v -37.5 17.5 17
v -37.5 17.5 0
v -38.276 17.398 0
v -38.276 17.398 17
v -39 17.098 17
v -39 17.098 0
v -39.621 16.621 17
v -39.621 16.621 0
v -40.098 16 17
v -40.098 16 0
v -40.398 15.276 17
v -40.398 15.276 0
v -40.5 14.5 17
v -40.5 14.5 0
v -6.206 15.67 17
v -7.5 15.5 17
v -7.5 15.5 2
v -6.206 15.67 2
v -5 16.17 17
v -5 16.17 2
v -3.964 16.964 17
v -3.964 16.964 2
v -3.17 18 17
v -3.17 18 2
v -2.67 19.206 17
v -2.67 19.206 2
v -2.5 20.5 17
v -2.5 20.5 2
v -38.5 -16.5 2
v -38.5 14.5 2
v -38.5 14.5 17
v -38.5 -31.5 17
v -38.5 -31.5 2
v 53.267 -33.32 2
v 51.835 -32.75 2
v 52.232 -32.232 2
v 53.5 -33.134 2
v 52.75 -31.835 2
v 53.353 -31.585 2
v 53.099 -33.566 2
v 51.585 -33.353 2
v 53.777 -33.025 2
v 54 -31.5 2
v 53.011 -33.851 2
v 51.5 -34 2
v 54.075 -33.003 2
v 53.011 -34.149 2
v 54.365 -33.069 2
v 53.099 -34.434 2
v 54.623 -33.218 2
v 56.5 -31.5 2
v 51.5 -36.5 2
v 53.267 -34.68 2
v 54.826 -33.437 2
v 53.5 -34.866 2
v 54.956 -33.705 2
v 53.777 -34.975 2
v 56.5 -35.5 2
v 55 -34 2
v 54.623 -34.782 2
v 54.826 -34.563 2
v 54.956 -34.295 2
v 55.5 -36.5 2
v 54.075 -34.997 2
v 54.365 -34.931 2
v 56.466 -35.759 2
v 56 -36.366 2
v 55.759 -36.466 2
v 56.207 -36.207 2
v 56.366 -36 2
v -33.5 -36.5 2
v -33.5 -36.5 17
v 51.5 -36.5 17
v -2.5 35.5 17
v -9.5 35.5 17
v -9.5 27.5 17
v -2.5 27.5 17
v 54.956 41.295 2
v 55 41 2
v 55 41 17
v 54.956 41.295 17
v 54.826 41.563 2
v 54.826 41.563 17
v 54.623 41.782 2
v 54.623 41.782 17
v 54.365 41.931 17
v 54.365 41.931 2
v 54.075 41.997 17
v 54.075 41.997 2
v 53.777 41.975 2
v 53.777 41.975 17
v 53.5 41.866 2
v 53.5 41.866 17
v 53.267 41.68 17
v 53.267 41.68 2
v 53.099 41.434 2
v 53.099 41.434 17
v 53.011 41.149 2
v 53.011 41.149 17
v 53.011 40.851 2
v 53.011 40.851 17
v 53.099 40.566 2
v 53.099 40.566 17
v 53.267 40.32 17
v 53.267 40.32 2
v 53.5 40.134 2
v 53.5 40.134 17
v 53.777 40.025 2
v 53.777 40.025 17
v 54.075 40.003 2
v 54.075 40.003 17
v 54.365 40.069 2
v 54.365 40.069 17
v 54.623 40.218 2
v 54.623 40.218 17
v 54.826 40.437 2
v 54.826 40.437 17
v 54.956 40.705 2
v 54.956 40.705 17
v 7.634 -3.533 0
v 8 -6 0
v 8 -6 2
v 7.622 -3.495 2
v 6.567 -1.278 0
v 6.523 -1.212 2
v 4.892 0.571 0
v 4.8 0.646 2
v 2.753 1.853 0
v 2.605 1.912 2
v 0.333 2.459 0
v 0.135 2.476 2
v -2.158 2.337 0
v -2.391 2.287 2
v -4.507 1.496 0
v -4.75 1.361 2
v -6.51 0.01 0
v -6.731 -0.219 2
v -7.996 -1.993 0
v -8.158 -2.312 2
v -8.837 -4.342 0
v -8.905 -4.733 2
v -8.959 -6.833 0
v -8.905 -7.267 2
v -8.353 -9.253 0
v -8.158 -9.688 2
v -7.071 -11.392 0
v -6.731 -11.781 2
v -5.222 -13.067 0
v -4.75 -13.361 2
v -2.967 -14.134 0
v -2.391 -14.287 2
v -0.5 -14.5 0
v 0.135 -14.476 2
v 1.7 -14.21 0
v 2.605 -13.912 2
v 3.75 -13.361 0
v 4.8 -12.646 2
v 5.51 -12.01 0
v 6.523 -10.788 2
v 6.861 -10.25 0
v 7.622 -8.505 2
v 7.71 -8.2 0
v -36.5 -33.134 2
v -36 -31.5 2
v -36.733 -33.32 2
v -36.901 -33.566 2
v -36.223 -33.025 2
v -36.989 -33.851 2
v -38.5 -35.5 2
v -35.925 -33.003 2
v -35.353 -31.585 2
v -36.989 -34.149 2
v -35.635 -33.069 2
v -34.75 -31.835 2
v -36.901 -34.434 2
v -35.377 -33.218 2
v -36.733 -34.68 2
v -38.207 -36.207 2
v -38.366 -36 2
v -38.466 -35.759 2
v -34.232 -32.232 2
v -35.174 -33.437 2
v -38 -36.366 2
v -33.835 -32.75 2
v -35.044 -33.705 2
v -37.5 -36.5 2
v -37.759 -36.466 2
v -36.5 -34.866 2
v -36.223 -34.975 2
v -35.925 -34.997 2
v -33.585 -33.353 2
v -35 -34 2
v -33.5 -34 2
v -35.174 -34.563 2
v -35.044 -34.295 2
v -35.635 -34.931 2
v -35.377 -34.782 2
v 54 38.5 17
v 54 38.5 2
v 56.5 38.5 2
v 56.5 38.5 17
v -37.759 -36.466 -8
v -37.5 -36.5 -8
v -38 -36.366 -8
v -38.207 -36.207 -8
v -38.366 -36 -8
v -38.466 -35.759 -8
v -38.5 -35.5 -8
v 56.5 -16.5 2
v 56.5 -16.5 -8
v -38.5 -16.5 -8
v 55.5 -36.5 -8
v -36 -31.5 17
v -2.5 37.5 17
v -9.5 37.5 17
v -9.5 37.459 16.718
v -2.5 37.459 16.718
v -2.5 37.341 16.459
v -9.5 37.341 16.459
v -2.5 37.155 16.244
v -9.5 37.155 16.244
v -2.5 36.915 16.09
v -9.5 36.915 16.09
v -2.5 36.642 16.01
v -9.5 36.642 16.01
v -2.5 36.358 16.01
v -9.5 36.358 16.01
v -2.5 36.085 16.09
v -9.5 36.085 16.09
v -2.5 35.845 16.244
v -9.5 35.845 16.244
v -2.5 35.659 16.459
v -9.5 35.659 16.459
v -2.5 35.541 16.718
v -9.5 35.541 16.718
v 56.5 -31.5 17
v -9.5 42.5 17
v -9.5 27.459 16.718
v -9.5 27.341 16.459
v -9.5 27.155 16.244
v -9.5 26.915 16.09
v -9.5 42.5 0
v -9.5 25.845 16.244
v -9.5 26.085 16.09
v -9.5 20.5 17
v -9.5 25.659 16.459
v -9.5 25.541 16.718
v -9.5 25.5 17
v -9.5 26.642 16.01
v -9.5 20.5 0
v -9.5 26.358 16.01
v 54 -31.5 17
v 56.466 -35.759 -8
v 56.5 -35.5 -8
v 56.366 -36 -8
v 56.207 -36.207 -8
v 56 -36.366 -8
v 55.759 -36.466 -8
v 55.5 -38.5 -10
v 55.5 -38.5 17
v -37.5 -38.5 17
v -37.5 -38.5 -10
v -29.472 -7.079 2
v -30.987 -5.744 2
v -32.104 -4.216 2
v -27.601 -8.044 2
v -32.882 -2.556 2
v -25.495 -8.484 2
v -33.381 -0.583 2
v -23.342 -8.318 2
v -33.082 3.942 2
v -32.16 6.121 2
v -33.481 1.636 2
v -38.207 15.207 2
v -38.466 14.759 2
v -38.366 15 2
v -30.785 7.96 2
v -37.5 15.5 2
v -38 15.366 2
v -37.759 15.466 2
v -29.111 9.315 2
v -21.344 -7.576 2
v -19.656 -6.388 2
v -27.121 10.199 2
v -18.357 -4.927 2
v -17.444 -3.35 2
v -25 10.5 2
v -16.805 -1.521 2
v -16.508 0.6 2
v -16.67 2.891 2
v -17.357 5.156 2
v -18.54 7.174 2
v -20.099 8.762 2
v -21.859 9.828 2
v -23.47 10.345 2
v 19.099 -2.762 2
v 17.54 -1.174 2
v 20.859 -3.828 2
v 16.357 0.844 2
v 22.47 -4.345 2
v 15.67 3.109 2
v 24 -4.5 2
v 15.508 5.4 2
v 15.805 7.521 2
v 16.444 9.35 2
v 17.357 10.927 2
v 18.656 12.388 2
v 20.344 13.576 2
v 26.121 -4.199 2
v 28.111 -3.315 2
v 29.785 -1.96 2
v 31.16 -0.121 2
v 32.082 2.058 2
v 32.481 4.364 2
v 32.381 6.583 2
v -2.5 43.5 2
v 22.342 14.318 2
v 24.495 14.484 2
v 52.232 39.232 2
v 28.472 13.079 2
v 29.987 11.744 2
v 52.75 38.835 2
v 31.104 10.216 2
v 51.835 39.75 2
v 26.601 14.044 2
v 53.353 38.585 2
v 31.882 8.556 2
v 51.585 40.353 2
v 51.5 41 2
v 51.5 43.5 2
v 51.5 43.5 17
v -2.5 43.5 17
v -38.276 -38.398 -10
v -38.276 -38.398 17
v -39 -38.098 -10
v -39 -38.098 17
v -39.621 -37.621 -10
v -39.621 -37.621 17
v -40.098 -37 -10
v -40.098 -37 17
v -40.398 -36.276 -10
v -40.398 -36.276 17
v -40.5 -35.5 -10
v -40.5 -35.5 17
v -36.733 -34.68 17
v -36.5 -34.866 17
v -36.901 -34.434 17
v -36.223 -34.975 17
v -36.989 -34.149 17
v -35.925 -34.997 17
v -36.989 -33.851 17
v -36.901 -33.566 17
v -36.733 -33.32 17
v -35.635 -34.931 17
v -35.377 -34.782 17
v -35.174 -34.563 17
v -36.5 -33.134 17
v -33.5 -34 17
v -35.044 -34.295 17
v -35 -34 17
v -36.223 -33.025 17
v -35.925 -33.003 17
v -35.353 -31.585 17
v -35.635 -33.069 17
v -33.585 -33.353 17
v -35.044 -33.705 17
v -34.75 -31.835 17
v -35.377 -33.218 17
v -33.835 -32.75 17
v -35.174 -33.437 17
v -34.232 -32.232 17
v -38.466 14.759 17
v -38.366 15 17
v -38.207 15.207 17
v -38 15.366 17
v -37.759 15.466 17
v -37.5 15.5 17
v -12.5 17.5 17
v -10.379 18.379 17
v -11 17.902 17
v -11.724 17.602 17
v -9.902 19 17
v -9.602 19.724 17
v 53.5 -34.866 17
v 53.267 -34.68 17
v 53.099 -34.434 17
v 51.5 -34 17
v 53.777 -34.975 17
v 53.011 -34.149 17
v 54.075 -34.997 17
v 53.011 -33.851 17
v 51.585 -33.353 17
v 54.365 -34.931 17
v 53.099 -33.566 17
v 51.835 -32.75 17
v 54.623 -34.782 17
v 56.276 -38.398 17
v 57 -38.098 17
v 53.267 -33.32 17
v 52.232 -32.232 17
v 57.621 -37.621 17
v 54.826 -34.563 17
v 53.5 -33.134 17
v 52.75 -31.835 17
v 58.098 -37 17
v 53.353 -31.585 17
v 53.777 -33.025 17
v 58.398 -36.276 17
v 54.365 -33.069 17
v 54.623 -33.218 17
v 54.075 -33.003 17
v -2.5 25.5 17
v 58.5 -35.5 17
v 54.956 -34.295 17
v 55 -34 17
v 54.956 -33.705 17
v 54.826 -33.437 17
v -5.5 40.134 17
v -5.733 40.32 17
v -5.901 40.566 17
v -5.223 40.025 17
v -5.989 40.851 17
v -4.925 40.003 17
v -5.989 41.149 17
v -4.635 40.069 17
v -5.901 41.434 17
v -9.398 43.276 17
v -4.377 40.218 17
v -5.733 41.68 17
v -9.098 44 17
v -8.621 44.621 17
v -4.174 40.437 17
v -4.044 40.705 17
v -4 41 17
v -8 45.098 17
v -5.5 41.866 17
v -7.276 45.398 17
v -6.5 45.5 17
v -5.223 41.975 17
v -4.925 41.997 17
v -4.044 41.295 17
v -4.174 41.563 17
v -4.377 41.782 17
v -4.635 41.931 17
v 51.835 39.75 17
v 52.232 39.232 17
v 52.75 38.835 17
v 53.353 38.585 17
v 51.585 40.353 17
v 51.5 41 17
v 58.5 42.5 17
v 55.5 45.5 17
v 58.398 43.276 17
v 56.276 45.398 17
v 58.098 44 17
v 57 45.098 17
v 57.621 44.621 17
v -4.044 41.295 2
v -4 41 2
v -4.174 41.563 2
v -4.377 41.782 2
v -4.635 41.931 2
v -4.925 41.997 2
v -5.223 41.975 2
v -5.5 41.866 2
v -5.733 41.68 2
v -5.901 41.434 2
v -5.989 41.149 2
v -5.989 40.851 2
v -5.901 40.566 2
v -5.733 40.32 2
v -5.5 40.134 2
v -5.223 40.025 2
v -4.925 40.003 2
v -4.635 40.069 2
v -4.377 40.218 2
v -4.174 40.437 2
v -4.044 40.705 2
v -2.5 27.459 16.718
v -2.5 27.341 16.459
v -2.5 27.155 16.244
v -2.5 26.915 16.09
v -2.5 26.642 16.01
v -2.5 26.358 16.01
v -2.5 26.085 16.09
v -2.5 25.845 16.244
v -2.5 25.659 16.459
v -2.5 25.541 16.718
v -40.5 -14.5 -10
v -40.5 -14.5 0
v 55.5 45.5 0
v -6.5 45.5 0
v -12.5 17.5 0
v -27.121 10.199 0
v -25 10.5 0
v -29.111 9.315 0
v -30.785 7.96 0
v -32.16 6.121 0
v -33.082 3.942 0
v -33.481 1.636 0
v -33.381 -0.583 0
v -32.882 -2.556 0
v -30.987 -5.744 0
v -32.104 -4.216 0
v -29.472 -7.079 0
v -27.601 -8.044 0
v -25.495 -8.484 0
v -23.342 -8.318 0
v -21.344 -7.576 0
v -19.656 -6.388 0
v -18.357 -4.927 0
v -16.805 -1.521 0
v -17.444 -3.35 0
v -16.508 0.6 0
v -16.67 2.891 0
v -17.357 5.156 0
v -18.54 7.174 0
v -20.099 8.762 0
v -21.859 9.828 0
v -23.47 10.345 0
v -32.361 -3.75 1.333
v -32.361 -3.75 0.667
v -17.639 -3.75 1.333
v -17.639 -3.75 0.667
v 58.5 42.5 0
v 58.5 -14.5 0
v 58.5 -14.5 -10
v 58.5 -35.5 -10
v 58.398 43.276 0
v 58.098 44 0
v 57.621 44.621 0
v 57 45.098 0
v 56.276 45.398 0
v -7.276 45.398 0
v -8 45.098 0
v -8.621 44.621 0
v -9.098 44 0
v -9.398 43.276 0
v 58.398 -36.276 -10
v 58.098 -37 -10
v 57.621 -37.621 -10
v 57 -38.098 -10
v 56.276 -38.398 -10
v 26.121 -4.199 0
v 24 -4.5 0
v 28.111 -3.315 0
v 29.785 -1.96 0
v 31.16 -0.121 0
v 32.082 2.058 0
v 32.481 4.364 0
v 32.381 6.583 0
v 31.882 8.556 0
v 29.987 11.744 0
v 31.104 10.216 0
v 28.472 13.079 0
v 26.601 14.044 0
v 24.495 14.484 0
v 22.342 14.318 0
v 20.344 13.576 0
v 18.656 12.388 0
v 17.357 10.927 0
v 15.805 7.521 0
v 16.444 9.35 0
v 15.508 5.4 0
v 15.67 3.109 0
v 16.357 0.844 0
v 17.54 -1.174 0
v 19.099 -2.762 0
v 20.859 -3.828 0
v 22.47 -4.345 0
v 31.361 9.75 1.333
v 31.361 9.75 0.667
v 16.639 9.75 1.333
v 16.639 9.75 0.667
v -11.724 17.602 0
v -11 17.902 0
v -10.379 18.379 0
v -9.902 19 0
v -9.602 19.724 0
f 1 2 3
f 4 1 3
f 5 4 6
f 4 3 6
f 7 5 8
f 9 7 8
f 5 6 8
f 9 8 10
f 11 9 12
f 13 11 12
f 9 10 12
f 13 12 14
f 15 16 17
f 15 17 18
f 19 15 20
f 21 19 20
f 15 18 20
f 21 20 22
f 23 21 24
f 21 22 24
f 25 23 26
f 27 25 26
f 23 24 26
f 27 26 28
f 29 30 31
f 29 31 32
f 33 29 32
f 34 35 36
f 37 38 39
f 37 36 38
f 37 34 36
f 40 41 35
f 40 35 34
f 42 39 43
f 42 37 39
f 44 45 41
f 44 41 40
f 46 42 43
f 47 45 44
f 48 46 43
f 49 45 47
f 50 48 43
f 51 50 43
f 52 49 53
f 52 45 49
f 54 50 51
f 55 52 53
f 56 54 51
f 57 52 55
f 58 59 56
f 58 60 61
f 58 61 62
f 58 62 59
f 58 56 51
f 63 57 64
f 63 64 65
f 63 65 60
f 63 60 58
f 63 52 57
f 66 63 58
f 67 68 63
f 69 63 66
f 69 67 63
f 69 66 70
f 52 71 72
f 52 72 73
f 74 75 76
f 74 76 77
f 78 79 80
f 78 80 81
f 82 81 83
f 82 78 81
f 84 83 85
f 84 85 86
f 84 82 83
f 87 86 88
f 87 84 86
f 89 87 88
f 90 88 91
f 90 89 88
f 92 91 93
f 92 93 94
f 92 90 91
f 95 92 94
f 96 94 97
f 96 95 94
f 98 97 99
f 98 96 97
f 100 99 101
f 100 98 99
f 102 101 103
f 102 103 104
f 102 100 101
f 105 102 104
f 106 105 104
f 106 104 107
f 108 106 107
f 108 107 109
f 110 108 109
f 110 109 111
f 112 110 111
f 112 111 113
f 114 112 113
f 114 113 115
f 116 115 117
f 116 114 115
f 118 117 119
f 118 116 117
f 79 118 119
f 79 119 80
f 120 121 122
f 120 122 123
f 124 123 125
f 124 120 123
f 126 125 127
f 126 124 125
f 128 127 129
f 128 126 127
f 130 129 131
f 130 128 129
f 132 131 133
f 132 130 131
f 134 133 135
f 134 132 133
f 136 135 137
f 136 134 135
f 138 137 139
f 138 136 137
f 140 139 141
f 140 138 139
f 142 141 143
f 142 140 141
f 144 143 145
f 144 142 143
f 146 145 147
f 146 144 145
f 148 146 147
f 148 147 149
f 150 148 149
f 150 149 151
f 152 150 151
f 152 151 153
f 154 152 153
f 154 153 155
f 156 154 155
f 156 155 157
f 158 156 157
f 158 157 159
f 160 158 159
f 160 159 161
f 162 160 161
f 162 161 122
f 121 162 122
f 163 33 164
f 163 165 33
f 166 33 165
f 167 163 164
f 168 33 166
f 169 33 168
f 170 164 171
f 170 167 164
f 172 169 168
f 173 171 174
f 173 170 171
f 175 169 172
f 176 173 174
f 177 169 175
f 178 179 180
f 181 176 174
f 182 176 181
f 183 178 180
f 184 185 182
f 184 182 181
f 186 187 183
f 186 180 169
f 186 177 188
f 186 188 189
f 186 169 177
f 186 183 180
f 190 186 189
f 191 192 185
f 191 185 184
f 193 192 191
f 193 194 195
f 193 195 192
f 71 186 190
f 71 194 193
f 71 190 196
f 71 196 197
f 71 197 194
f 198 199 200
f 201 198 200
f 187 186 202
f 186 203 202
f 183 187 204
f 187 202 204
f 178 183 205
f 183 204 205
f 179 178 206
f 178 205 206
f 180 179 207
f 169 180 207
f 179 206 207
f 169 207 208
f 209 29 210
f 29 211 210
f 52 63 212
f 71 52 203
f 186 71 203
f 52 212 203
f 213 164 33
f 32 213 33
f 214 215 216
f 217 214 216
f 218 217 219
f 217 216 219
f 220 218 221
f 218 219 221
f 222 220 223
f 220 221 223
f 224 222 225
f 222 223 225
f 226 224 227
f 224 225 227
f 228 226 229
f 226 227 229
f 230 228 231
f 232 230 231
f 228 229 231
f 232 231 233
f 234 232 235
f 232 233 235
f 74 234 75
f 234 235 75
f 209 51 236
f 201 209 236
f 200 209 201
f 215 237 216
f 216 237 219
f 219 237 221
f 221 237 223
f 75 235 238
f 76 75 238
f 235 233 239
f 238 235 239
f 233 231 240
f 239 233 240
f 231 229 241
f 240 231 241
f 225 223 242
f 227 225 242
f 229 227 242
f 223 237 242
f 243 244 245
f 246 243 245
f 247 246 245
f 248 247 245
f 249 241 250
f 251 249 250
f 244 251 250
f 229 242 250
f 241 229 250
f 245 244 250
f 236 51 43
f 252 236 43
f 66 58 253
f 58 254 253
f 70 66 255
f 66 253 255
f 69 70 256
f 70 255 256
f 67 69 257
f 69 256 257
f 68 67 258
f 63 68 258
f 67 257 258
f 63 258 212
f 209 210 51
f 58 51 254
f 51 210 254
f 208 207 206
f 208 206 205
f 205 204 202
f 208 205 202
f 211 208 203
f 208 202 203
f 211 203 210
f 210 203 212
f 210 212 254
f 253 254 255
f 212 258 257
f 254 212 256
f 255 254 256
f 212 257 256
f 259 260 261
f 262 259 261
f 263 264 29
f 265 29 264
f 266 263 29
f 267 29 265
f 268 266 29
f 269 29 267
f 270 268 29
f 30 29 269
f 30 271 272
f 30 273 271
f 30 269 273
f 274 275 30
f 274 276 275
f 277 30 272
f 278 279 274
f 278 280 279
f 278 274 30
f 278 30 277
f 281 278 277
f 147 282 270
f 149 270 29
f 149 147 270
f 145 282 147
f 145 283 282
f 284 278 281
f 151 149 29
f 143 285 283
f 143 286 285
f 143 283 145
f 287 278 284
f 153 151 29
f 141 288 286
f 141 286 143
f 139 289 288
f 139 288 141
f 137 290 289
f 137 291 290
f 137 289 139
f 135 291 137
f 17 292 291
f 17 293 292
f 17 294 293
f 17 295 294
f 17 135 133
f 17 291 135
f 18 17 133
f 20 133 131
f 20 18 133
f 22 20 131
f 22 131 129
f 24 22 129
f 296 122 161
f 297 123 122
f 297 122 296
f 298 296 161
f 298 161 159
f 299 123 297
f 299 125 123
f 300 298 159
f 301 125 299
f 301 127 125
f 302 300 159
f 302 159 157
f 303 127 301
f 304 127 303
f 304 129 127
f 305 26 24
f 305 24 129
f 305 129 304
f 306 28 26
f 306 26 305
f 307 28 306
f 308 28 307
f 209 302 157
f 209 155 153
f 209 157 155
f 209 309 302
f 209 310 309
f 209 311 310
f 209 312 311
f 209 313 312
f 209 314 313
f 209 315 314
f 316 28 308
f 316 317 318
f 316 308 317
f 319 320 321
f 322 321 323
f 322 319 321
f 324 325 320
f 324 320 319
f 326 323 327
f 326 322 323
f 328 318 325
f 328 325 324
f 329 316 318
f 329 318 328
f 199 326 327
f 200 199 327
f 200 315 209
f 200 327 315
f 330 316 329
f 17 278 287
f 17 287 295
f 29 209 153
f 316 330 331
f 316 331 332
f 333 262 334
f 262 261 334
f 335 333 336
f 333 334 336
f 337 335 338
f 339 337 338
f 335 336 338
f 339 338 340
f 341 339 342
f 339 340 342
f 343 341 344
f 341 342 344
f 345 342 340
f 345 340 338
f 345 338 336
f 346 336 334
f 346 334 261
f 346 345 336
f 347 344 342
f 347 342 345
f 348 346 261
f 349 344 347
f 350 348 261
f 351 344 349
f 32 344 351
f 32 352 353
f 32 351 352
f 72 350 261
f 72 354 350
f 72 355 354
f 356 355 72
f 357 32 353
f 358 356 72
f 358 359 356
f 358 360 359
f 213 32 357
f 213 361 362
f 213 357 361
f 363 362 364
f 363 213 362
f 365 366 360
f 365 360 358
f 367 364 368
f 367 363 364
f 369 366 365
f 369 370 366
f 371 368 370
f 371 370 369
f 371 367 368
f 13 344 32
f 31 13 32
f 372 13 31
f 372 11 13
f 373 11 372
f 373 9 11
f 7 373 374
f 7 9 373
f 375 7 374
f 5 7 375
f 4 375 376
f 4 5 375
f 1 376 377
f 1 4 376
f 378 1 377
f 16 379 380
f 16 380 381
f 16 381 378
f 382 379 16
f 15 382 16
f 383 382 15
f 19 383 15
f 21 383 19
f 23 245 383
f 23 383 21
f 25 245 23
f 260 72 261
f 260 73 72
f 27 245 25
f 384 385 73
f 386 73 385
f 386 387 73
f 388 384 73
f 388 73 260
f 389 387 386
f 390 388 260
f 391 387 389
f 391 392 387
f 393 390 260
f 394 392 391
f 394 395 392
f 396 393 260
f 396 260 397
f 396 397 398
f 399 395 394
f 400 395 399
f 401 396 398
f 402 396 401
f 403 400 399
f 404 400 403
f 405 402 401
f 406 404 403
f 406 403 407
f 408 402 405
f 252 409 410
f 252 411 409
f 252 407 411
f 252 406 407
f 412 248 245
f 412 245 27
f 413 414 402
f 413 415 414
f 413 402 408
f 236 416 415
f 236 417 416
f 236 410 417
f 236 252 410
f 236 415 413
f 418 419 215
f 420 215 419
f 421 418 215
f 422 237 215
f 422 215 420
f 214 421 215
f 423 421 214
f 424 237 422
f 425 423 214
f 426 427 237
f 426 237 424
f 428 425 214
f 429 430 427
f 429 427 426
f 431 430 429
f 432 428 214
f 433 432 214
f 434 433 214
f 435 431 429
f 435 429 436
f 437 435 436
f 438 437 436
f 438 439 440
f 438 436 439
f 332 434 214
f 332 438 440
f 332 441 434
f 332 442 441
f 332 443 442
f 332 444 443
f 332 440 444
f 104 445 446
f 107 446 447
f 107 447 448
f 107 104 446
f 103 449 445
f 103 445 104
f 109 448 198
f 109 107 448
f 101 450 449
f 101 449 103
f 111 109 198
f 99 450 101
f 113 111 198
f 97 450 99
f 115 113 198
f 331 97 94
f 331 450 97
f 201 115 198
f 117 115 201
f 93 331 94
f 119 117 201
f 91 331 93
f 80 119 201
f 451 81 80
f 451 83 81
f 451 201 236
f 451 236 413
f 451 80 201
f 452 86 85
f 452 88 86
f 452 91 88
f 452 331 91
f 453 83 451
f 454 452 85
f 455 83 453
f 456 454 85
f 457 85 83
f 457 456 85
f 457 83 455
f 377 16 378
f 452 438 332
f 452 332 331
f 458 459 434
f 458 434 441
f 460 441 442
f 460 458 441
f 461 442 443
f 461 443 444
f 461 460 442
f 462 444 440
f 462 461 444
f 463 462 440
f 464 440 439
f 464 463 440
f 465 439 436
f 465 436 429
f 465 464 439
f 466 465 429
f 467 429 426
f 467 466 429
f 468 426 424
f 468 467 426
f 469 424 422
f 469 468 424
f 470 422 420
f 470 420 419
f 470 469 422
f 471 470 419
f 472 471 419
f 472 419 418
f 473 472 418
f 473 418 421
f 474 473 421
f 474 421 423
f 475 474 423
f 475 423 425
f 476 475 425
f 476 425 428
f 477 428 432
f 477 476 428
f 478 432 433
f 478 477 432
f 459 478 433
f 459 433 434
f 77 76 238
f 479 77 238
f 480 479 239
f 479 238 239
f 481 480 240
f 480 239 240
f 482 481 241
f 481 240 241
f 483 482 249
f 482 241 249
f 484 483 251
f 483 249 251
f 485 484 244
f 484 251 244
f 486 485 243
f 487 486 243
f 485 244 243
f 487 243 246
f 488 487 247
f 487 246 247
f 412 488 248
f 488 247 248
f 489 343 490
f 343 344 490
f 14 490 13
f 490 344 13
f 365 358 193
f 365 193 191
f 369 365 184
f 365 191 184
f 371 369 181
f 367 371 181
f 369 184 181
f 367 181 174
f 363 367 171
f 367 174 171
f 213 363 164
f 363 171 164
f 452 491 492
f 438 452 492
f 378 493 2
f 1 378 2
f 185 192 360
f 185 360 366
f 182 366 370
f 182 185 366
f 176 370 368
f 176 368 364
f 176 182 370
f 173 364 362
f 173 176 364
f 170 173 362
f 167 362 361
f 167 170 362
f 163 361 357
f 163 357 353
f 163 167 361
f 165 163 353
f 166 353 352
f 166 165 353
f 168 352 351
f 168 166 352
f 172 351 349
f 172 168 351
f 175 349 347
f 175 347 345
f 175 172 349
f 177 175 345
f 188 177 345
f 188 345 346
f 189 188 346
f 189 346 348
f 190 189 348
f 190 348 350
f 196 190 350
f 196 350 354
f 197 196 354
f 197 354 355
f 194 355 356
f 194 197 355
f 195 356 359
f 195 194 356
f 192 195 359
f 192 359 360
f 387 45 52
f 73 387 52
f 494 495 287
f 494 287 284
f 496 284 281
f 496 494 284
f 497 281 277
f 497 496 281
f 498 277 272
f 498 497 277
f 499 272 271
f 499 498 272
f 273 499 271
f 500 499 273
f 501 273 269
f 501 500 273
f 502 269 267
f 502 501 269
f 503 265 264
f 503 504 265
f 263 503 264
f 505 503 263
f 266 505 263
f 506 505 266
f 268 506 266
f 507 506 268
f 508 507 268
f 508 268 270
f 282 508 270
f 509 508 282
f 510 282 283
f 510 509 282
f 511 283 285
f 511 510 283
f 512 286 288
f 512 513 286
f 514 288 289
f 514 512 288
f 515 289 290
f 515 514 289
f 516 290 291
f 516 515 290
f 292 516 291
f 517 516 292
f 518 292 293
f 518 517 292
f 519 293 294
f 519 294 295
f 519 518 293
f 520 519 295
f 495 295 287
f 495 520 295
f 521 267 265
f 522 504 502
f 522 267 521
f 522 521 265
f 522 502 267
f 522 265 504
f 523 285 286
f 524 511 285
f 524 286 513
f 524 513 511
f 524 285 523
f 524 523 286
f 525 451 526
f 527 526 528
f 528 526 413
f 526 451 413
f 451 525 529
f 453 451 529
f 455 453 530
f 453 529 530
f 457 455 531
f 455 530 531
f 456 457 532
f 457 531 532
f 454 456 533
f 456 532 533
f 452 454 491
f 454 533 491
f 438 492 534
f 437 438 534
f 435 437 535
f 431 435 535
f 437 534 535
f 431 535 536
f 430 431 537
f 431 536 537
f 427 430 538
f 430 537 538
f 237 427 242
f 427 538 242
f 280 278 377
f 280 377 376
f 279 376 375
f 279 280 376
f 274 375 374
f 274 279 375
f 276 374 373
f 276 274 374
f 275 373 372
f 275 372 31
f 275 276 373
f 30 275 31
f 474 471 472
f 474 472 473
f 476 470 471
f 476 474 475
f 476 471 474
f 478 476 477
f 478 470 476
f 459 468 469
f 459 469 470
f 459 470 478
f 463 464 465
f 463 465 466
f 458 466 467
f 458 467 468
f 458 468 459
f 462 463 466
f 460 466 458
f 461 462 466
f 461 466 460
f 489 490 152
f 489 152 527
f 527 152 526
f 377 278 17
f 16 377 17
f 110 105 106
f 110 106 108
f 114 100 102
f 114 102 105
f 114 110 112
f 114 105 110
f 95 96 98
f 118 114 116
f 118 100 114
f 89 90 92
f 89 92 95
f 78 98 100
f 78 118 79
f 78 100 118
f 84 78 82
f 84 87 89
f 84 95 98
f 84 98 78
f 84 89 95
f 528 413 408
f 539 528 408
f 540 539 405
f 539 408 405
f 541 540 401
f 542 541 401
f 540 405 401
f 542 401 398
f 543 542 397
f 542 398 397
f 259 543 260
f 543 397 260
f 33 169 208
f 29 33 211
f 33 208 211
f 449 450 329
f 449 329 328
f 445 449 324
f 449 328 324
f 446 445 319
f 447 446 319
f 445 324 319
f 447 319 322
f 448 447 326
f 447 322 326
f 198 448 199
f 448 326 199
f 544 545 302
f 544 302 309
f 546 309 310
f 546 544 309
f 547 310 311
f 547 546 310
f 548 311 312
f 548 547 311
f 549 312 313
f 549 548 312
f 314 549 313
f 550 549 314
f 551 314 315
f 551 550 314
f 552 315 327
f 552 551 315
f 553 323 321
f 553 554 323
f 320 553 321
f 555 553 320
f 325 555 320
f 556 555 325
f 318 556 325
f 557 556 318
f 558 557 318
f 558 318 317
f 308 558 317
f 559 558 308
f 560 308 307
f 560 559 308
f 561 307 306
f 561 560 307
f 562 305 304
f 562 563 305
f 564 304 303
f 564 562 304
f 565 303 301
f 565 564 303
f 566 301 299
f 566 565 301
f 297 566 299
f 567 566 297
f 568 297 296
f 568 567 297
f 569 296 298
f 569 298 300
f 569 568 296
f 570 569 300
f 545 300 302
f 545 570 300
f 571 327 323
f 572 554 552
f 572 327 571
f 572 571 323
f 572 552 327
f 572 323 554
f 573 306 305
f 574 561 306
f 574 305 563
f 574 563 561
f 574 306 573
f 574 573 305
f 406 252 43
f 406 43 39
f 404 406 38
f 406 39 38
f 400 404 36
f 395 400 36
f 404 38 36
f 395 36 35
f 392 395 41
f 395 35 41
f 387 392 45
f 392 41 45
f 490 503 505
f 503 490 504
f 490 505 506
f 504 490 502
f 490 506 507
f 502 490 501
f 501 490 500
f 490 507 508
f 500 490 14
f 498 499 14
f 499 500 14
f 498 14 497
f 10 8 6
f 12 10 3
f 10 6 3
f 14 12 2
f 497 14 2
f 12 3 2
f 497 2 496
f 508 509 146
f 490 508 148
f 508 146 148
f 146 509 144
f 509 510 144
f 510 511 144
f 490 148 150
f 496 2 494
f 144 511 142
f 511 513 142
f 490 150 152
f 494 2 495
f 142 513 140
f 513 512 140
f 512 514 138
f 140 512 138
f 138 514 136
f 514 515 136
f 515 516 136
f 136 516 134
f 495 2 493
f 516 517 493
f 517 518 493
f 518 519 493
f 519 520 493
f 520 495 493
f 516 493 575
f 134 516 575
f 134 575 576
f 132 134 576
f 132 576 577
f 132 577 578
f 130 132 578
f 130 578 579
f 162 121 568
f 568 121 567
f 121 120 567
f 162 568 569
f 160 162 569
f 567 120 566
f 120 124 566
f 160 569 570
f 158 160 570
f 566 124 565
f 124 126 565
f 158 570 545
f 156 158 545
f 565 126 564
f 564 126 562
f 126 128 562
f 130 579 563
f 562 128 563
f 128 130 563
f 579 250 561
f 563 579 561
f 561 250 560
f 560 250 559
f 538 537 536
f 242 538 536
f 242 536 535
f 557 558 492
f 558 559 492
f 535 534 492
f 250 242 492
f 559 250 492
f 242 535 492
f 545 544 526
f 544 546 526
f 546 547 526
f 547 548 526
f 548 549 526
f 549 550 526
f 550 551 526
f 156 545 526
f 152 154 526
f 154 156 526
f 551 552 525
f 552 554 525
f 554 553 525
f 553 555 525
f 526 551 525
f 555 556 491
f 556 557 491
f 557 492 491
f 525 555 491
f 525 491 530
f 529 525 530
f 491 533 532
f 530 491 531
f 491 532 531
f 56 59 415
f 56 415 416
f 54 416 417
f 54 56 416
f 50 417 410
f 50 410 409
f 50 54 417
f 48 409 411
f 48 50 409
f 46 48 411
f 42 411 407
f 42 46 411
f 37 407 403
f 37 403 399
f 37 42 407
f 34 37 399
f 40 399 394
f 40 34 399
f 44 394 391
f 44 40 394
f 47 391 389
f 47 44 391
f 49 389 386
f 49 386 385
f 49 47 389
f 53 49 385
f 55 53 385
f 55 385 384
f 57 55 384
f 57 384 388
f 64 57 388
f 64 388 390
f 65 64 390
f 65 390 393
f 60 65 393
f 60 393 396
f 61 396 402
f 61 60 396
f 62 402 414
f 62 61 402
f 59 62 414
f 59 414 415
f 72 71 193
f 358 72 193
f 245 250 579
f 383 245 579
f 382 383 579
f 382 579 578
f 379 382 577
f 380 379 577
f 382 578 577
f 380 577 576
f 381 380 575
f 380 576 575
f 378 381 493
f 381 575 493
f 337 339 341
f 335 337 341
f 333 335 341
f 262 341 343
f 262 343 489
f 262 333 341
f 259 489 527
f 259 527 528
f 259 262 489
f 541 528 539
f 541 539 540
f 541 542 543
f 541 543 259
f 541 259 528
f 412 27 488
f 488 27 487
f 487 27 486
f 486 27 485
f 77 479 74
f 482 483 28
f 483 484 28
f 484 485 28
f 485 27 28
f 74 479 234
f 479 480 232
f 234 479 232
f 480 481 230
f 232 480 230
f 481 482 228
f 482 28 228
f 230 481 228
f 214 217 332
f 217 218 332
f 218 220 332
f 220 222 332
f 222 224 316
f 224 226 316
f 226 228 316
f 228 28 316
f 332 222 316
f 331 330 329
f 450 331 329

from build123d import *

# Parameters (mm, degrees)
F1_DEPTH  = 17
F3_T      = -2
F2_R      = 8.5
F4_DEPTH  = 2
F5_R      = 1
F6_DEPTH  = 15
F7_R      = 1
F8_DEPTH  = 7
F11_DEPTH = 10
F12_DEPTH = 8
F13_DEPTH = 2


with BuildPart() as f1:
    # F0 (on Top) → F1 (new body)
    with BuildSketch(Plane.XY):
        with BuildLine():
            Line((-12.5, 17.5), (-37.5, 17.5))
            ThreePointArc((-37.5, 17.5), (-39.6213203436, 16.6213203436), (-40.5, 14.5))
            Line((-40.5, 14.5), (-40.5, -17.5))
            Line((-40.5, -17.5), (-40.5, -35.5))
            ThreePointArc((-40.5, -35.5), (-39.6213203436, -37.6213203436), (-37.5, -38.5))
            Line((-37.5, -38.5), (55.5, -38.5))
            ThreePointArc((55.5, -38.5), (57.6213203436, -37.6213203436), (58.5, -35.5))
            Line((58.5, -35.5), (58.5, -17.5))
            Line((58.5, -17.5), (40.5, -17.5))
            Line((40.5, -17.5), (40.5, 17.5))
            Line((40.5, 17.5), (40.5, 42.5))
            ThreePointArc((40.5, 42.5), (39.6213203436, 44.6213203436), (37.5, 45.5))
            Line((37.5, 45.5), (-6.5, 45.5))
            ThreePointArc((-6.5, 45.5), (-8.6213203436, 44.6213203436), (-9.5, 42.5))
            Line((-9.5, 42.5), (-9.5, 20.5))
            ThreePointArc((-9.5, 20.5), (-10.3786796564, 18.3786796564), (-12.5, 17.5))
        make_face()
        with BuildLine():
            Line((55.5, 45.5), (37.5, 45.5))
            ThreePointArc((37.5, 45.5), (39.6213203436, 44.6213203436), (40.5, 42.5))
            Line((40.5, 42.5), (40.5, 17.5))
            Line((40.5, 17.5), (40.5, -17.5))
            Line((40.5, -17.5), (58.5, -17.5))
            Line((58.5, -17.5), (58.5, 42.5))
            ThreePointArc((58.5, 42.5), (57.6213203436, 44.6213203436), (55.5, 45.5))
        make_face()
    extrude(amount=F1_DEPTH)

    # F3
    f3_openings = [f1.faces().sort_by_distance(p)[0] for p in [
        (12.966173, 0.233802, 17),
    ]]
    offset(amount=F3_T, openings=f3_openings)

    # F2 (on Top) → F4 (cut, through all)
    with BuildSketch(Plane.XY):
        with BuildLine():
            add(Edge.make_bspline(
                [(-25, 10.5), (-39.7224318643, 10.5), (-32.3612159322, -3.75), (-25, -18), (-17.6387840678, -3.75), (-10.2775681357, 10.5), (-25, 10.5)],
                knots=[0, 0, 0, 2.0943951024, 2.0943951024, 4.1887902048, 4.1887902048, 6.2831853072, 6.2831853072, 6.2831853072], degree=2, weights=[1, 0.5, 1, 0.5, 1, 0.5, 1]))
        make_face()
        with BuildLine():
            add(Edge.make_bspline(
                [(24, -4.5), (38.7224318643, -4.5), (31.3612159322, 9.75), (24, 24), (16.6387840678, 9.75), (9.2775681357, -4.5), (24, -4.5)],
                knots=[0, 0, 0, 2.0943951024, 2.0943951024, 4.1887902048, 4.1887902048, 6.2831853072, 6.2831853072, 6.2831853072], degree=2, weights=[1, 0.5, 1, 0.5, 1, 0.5, 1]))
        make_face()
        with Locations((-0.5, -6)):
            Circle(F2_R)
    extrude(amount=F4_DEPTH, mode=Mode.SUBTRACT)

    # F5 (on face) → F6 (join, through all)
    with BuildSketch(Plane.XY.offset(2)):
        with BuildLine():
            ThreePointArc((51.5, 41), (52.232233047, 39.232233047), (54, 38.5))
            Line((54, 38.5), (56.5, 38.5))
            Line((56.5, 38.5), (56.5, 43.5))
            Line((56.5, 43.5), (51.5, 43.5))
            Line((51.5, 43.5), (51.5, 41))
        make_face()
        with Locations((54, 41)):
            Circle(F5_R, mode=Mode.SUBTRACT)
        with BuildLine():
            Line((-2.5, 43.5), (-7.5, 43.5))
            Line((-7.5, 43.5), (-7.5, 38.5))
            Line((-7.5, 38.5), (-7.5, 20.5))
            Line((-7.5, 20.5), (-12.5, 15.5))
            Line((-12.5, 15.5), (-7.5, 15.5))
            ThreePointArc((-7.5, 15.5), (-3.9644660941, 16.9644660941), (-2.5, 20.5))
            Line((-2.5, 20.5), (-2.5, 43.5))
        make_face()
        with Locations((-5, 41)):
            Circle(F5_R, mode=Mode.SUBTRACT)
        with BuildLine():
            Line((56.5, -31.5), (54, -31.5))
            ThreePointArc((54, -31.5), (52.232233047, -32.232233047), (51.5, -34))
            Line((51.5, -34), (51.5, -36.5))
            Line((51.5, -36.5), (56.5, -36.5))
            Line((56.5, -36.5), (56.5, -31.5))
        make_face()
        with Locations((54, -34)):
            Circle(F5_R, mode=Mode.SUBTRACT)
        with BuildLine():
            Line((-33.5, -36.5), (-33.5, -34))
            ThreePointArc((-33.5, -34), (-34.232233047, -32.232233047), (-36, -31.5))
            Line((-36, -31.5), (-38.5, -31.5))
            Line((-38.5, -31.5), (-38.5, -36.5))
            Line((-38.5, -36.5), (-33.5, -36.5))
        make_face()
        with Locations((-36, -34)):
            Circle(F5_R, mode=Mode.SUBTRACT)
    extrude(amount=F6_DEPTH)

    # F7 (on face) → F8 (cut, through all)
    with BuildSketch(Plane(origin=(-9.5, 0, 0), x_dir=(0, -1, 0), z_dir=(-1, 0, 0))):
        with Locations((-26.5, 17)):
            Circle(F7_R)
        with Locations((-36.5, 17)):
            Circle(F7_R)
    extrude(amount=-F8_DEPTH, mode=Mode.SUBTRACT)

    # F10 (on face) → F11 (join)
    with BuildSketch(Plane(origin=(0, 0, 0), x_dir=(1, 0, 0), z_dir=(0, 0, -1))):
        with BuildLine():
            Line((55.5, 38.5), (-37.5, 38.5))
            ThreePointArc((-37.5, 38.5), (-39.6213203436, 37.6213203436), (-40.5, 35.5))
            Line((-40.5, 35.5), (-40.5, 14.5))
            Line((-40.5, 14.5), (-0.5, 14.5))
            Line((-0.5, 14.5), (58.5, 14.5))
            Line((58.5, 14.5), (58.5, 35.5))
            ThreePointArc((58.5, 35.5), (57.6213203436, 37.6213203436), (55.5, 38.5))
        make_face()
    extrude(amount=F11_DEPTH)

    # F9 (on face) → F12 (cut)
    with BuildSketch(Plane(origin=(0, 0, 0), x_dir=(1, 0, 0), z_dir=(0, 0, -1))):
        with BuildLine():
            Line((56.4999997616, 16.5000002384), (56.4999997616, 35.5))
            ThreePointArc((56.4999997616, 35.5), (56.2071066126, 36.2071066126), (55.5, 36.4999997616))
            Line((55.5, 36.4999997616), (-37.5, 36.4999997616))
            ThreePointArc((-37.5, 36.4999997616), (-38.2071066126, 36.2071066126), (-38.4999997616, 35.5))
            Line((-38.4999997616, 35.5), (-38.4999997616, 16.5000002384))
            Line((-38.4999997616, 16.5000002384), (56.4999997616, 16.5000002384))
        make_face()
    extrude(amount=F12_DEPTH, mode=Mode.SUBTRACT)

    # F9 (on face) → F13 (cut)
    with BuildSketch(Plane(origin=(0, 0, 0), x_dir=(1, 0, 0), z_dir=(0, 0, -1))):
        with BuildLine():
            Line((56.4999997616, 16.5000002384), (56.4999997616, 35.5))
            ThreePointArc((56.4999997616, 35.5), (56.2071066126, 36.2071066126), (55.5, 36.4999997616))
            Line((55.5, 36.4999997616), (-37.5, 36.4999997616))
            ThreePointArc((-37.5, 36.4999997616), (-38.2071066126, 36.2071066126), (-38.4999997616, 35.5))
            Line((-38.4999997616, 35.5), (-38.4999997616, 16.5000002384))
            Line((-38.4999997616, 16.5000002384), (56.4999997616, 16.5000002384))
        make_face()
    extrude(amount=-F13_DEPTH, mode=Mode.SUBTRACT)


solid = f1.part
